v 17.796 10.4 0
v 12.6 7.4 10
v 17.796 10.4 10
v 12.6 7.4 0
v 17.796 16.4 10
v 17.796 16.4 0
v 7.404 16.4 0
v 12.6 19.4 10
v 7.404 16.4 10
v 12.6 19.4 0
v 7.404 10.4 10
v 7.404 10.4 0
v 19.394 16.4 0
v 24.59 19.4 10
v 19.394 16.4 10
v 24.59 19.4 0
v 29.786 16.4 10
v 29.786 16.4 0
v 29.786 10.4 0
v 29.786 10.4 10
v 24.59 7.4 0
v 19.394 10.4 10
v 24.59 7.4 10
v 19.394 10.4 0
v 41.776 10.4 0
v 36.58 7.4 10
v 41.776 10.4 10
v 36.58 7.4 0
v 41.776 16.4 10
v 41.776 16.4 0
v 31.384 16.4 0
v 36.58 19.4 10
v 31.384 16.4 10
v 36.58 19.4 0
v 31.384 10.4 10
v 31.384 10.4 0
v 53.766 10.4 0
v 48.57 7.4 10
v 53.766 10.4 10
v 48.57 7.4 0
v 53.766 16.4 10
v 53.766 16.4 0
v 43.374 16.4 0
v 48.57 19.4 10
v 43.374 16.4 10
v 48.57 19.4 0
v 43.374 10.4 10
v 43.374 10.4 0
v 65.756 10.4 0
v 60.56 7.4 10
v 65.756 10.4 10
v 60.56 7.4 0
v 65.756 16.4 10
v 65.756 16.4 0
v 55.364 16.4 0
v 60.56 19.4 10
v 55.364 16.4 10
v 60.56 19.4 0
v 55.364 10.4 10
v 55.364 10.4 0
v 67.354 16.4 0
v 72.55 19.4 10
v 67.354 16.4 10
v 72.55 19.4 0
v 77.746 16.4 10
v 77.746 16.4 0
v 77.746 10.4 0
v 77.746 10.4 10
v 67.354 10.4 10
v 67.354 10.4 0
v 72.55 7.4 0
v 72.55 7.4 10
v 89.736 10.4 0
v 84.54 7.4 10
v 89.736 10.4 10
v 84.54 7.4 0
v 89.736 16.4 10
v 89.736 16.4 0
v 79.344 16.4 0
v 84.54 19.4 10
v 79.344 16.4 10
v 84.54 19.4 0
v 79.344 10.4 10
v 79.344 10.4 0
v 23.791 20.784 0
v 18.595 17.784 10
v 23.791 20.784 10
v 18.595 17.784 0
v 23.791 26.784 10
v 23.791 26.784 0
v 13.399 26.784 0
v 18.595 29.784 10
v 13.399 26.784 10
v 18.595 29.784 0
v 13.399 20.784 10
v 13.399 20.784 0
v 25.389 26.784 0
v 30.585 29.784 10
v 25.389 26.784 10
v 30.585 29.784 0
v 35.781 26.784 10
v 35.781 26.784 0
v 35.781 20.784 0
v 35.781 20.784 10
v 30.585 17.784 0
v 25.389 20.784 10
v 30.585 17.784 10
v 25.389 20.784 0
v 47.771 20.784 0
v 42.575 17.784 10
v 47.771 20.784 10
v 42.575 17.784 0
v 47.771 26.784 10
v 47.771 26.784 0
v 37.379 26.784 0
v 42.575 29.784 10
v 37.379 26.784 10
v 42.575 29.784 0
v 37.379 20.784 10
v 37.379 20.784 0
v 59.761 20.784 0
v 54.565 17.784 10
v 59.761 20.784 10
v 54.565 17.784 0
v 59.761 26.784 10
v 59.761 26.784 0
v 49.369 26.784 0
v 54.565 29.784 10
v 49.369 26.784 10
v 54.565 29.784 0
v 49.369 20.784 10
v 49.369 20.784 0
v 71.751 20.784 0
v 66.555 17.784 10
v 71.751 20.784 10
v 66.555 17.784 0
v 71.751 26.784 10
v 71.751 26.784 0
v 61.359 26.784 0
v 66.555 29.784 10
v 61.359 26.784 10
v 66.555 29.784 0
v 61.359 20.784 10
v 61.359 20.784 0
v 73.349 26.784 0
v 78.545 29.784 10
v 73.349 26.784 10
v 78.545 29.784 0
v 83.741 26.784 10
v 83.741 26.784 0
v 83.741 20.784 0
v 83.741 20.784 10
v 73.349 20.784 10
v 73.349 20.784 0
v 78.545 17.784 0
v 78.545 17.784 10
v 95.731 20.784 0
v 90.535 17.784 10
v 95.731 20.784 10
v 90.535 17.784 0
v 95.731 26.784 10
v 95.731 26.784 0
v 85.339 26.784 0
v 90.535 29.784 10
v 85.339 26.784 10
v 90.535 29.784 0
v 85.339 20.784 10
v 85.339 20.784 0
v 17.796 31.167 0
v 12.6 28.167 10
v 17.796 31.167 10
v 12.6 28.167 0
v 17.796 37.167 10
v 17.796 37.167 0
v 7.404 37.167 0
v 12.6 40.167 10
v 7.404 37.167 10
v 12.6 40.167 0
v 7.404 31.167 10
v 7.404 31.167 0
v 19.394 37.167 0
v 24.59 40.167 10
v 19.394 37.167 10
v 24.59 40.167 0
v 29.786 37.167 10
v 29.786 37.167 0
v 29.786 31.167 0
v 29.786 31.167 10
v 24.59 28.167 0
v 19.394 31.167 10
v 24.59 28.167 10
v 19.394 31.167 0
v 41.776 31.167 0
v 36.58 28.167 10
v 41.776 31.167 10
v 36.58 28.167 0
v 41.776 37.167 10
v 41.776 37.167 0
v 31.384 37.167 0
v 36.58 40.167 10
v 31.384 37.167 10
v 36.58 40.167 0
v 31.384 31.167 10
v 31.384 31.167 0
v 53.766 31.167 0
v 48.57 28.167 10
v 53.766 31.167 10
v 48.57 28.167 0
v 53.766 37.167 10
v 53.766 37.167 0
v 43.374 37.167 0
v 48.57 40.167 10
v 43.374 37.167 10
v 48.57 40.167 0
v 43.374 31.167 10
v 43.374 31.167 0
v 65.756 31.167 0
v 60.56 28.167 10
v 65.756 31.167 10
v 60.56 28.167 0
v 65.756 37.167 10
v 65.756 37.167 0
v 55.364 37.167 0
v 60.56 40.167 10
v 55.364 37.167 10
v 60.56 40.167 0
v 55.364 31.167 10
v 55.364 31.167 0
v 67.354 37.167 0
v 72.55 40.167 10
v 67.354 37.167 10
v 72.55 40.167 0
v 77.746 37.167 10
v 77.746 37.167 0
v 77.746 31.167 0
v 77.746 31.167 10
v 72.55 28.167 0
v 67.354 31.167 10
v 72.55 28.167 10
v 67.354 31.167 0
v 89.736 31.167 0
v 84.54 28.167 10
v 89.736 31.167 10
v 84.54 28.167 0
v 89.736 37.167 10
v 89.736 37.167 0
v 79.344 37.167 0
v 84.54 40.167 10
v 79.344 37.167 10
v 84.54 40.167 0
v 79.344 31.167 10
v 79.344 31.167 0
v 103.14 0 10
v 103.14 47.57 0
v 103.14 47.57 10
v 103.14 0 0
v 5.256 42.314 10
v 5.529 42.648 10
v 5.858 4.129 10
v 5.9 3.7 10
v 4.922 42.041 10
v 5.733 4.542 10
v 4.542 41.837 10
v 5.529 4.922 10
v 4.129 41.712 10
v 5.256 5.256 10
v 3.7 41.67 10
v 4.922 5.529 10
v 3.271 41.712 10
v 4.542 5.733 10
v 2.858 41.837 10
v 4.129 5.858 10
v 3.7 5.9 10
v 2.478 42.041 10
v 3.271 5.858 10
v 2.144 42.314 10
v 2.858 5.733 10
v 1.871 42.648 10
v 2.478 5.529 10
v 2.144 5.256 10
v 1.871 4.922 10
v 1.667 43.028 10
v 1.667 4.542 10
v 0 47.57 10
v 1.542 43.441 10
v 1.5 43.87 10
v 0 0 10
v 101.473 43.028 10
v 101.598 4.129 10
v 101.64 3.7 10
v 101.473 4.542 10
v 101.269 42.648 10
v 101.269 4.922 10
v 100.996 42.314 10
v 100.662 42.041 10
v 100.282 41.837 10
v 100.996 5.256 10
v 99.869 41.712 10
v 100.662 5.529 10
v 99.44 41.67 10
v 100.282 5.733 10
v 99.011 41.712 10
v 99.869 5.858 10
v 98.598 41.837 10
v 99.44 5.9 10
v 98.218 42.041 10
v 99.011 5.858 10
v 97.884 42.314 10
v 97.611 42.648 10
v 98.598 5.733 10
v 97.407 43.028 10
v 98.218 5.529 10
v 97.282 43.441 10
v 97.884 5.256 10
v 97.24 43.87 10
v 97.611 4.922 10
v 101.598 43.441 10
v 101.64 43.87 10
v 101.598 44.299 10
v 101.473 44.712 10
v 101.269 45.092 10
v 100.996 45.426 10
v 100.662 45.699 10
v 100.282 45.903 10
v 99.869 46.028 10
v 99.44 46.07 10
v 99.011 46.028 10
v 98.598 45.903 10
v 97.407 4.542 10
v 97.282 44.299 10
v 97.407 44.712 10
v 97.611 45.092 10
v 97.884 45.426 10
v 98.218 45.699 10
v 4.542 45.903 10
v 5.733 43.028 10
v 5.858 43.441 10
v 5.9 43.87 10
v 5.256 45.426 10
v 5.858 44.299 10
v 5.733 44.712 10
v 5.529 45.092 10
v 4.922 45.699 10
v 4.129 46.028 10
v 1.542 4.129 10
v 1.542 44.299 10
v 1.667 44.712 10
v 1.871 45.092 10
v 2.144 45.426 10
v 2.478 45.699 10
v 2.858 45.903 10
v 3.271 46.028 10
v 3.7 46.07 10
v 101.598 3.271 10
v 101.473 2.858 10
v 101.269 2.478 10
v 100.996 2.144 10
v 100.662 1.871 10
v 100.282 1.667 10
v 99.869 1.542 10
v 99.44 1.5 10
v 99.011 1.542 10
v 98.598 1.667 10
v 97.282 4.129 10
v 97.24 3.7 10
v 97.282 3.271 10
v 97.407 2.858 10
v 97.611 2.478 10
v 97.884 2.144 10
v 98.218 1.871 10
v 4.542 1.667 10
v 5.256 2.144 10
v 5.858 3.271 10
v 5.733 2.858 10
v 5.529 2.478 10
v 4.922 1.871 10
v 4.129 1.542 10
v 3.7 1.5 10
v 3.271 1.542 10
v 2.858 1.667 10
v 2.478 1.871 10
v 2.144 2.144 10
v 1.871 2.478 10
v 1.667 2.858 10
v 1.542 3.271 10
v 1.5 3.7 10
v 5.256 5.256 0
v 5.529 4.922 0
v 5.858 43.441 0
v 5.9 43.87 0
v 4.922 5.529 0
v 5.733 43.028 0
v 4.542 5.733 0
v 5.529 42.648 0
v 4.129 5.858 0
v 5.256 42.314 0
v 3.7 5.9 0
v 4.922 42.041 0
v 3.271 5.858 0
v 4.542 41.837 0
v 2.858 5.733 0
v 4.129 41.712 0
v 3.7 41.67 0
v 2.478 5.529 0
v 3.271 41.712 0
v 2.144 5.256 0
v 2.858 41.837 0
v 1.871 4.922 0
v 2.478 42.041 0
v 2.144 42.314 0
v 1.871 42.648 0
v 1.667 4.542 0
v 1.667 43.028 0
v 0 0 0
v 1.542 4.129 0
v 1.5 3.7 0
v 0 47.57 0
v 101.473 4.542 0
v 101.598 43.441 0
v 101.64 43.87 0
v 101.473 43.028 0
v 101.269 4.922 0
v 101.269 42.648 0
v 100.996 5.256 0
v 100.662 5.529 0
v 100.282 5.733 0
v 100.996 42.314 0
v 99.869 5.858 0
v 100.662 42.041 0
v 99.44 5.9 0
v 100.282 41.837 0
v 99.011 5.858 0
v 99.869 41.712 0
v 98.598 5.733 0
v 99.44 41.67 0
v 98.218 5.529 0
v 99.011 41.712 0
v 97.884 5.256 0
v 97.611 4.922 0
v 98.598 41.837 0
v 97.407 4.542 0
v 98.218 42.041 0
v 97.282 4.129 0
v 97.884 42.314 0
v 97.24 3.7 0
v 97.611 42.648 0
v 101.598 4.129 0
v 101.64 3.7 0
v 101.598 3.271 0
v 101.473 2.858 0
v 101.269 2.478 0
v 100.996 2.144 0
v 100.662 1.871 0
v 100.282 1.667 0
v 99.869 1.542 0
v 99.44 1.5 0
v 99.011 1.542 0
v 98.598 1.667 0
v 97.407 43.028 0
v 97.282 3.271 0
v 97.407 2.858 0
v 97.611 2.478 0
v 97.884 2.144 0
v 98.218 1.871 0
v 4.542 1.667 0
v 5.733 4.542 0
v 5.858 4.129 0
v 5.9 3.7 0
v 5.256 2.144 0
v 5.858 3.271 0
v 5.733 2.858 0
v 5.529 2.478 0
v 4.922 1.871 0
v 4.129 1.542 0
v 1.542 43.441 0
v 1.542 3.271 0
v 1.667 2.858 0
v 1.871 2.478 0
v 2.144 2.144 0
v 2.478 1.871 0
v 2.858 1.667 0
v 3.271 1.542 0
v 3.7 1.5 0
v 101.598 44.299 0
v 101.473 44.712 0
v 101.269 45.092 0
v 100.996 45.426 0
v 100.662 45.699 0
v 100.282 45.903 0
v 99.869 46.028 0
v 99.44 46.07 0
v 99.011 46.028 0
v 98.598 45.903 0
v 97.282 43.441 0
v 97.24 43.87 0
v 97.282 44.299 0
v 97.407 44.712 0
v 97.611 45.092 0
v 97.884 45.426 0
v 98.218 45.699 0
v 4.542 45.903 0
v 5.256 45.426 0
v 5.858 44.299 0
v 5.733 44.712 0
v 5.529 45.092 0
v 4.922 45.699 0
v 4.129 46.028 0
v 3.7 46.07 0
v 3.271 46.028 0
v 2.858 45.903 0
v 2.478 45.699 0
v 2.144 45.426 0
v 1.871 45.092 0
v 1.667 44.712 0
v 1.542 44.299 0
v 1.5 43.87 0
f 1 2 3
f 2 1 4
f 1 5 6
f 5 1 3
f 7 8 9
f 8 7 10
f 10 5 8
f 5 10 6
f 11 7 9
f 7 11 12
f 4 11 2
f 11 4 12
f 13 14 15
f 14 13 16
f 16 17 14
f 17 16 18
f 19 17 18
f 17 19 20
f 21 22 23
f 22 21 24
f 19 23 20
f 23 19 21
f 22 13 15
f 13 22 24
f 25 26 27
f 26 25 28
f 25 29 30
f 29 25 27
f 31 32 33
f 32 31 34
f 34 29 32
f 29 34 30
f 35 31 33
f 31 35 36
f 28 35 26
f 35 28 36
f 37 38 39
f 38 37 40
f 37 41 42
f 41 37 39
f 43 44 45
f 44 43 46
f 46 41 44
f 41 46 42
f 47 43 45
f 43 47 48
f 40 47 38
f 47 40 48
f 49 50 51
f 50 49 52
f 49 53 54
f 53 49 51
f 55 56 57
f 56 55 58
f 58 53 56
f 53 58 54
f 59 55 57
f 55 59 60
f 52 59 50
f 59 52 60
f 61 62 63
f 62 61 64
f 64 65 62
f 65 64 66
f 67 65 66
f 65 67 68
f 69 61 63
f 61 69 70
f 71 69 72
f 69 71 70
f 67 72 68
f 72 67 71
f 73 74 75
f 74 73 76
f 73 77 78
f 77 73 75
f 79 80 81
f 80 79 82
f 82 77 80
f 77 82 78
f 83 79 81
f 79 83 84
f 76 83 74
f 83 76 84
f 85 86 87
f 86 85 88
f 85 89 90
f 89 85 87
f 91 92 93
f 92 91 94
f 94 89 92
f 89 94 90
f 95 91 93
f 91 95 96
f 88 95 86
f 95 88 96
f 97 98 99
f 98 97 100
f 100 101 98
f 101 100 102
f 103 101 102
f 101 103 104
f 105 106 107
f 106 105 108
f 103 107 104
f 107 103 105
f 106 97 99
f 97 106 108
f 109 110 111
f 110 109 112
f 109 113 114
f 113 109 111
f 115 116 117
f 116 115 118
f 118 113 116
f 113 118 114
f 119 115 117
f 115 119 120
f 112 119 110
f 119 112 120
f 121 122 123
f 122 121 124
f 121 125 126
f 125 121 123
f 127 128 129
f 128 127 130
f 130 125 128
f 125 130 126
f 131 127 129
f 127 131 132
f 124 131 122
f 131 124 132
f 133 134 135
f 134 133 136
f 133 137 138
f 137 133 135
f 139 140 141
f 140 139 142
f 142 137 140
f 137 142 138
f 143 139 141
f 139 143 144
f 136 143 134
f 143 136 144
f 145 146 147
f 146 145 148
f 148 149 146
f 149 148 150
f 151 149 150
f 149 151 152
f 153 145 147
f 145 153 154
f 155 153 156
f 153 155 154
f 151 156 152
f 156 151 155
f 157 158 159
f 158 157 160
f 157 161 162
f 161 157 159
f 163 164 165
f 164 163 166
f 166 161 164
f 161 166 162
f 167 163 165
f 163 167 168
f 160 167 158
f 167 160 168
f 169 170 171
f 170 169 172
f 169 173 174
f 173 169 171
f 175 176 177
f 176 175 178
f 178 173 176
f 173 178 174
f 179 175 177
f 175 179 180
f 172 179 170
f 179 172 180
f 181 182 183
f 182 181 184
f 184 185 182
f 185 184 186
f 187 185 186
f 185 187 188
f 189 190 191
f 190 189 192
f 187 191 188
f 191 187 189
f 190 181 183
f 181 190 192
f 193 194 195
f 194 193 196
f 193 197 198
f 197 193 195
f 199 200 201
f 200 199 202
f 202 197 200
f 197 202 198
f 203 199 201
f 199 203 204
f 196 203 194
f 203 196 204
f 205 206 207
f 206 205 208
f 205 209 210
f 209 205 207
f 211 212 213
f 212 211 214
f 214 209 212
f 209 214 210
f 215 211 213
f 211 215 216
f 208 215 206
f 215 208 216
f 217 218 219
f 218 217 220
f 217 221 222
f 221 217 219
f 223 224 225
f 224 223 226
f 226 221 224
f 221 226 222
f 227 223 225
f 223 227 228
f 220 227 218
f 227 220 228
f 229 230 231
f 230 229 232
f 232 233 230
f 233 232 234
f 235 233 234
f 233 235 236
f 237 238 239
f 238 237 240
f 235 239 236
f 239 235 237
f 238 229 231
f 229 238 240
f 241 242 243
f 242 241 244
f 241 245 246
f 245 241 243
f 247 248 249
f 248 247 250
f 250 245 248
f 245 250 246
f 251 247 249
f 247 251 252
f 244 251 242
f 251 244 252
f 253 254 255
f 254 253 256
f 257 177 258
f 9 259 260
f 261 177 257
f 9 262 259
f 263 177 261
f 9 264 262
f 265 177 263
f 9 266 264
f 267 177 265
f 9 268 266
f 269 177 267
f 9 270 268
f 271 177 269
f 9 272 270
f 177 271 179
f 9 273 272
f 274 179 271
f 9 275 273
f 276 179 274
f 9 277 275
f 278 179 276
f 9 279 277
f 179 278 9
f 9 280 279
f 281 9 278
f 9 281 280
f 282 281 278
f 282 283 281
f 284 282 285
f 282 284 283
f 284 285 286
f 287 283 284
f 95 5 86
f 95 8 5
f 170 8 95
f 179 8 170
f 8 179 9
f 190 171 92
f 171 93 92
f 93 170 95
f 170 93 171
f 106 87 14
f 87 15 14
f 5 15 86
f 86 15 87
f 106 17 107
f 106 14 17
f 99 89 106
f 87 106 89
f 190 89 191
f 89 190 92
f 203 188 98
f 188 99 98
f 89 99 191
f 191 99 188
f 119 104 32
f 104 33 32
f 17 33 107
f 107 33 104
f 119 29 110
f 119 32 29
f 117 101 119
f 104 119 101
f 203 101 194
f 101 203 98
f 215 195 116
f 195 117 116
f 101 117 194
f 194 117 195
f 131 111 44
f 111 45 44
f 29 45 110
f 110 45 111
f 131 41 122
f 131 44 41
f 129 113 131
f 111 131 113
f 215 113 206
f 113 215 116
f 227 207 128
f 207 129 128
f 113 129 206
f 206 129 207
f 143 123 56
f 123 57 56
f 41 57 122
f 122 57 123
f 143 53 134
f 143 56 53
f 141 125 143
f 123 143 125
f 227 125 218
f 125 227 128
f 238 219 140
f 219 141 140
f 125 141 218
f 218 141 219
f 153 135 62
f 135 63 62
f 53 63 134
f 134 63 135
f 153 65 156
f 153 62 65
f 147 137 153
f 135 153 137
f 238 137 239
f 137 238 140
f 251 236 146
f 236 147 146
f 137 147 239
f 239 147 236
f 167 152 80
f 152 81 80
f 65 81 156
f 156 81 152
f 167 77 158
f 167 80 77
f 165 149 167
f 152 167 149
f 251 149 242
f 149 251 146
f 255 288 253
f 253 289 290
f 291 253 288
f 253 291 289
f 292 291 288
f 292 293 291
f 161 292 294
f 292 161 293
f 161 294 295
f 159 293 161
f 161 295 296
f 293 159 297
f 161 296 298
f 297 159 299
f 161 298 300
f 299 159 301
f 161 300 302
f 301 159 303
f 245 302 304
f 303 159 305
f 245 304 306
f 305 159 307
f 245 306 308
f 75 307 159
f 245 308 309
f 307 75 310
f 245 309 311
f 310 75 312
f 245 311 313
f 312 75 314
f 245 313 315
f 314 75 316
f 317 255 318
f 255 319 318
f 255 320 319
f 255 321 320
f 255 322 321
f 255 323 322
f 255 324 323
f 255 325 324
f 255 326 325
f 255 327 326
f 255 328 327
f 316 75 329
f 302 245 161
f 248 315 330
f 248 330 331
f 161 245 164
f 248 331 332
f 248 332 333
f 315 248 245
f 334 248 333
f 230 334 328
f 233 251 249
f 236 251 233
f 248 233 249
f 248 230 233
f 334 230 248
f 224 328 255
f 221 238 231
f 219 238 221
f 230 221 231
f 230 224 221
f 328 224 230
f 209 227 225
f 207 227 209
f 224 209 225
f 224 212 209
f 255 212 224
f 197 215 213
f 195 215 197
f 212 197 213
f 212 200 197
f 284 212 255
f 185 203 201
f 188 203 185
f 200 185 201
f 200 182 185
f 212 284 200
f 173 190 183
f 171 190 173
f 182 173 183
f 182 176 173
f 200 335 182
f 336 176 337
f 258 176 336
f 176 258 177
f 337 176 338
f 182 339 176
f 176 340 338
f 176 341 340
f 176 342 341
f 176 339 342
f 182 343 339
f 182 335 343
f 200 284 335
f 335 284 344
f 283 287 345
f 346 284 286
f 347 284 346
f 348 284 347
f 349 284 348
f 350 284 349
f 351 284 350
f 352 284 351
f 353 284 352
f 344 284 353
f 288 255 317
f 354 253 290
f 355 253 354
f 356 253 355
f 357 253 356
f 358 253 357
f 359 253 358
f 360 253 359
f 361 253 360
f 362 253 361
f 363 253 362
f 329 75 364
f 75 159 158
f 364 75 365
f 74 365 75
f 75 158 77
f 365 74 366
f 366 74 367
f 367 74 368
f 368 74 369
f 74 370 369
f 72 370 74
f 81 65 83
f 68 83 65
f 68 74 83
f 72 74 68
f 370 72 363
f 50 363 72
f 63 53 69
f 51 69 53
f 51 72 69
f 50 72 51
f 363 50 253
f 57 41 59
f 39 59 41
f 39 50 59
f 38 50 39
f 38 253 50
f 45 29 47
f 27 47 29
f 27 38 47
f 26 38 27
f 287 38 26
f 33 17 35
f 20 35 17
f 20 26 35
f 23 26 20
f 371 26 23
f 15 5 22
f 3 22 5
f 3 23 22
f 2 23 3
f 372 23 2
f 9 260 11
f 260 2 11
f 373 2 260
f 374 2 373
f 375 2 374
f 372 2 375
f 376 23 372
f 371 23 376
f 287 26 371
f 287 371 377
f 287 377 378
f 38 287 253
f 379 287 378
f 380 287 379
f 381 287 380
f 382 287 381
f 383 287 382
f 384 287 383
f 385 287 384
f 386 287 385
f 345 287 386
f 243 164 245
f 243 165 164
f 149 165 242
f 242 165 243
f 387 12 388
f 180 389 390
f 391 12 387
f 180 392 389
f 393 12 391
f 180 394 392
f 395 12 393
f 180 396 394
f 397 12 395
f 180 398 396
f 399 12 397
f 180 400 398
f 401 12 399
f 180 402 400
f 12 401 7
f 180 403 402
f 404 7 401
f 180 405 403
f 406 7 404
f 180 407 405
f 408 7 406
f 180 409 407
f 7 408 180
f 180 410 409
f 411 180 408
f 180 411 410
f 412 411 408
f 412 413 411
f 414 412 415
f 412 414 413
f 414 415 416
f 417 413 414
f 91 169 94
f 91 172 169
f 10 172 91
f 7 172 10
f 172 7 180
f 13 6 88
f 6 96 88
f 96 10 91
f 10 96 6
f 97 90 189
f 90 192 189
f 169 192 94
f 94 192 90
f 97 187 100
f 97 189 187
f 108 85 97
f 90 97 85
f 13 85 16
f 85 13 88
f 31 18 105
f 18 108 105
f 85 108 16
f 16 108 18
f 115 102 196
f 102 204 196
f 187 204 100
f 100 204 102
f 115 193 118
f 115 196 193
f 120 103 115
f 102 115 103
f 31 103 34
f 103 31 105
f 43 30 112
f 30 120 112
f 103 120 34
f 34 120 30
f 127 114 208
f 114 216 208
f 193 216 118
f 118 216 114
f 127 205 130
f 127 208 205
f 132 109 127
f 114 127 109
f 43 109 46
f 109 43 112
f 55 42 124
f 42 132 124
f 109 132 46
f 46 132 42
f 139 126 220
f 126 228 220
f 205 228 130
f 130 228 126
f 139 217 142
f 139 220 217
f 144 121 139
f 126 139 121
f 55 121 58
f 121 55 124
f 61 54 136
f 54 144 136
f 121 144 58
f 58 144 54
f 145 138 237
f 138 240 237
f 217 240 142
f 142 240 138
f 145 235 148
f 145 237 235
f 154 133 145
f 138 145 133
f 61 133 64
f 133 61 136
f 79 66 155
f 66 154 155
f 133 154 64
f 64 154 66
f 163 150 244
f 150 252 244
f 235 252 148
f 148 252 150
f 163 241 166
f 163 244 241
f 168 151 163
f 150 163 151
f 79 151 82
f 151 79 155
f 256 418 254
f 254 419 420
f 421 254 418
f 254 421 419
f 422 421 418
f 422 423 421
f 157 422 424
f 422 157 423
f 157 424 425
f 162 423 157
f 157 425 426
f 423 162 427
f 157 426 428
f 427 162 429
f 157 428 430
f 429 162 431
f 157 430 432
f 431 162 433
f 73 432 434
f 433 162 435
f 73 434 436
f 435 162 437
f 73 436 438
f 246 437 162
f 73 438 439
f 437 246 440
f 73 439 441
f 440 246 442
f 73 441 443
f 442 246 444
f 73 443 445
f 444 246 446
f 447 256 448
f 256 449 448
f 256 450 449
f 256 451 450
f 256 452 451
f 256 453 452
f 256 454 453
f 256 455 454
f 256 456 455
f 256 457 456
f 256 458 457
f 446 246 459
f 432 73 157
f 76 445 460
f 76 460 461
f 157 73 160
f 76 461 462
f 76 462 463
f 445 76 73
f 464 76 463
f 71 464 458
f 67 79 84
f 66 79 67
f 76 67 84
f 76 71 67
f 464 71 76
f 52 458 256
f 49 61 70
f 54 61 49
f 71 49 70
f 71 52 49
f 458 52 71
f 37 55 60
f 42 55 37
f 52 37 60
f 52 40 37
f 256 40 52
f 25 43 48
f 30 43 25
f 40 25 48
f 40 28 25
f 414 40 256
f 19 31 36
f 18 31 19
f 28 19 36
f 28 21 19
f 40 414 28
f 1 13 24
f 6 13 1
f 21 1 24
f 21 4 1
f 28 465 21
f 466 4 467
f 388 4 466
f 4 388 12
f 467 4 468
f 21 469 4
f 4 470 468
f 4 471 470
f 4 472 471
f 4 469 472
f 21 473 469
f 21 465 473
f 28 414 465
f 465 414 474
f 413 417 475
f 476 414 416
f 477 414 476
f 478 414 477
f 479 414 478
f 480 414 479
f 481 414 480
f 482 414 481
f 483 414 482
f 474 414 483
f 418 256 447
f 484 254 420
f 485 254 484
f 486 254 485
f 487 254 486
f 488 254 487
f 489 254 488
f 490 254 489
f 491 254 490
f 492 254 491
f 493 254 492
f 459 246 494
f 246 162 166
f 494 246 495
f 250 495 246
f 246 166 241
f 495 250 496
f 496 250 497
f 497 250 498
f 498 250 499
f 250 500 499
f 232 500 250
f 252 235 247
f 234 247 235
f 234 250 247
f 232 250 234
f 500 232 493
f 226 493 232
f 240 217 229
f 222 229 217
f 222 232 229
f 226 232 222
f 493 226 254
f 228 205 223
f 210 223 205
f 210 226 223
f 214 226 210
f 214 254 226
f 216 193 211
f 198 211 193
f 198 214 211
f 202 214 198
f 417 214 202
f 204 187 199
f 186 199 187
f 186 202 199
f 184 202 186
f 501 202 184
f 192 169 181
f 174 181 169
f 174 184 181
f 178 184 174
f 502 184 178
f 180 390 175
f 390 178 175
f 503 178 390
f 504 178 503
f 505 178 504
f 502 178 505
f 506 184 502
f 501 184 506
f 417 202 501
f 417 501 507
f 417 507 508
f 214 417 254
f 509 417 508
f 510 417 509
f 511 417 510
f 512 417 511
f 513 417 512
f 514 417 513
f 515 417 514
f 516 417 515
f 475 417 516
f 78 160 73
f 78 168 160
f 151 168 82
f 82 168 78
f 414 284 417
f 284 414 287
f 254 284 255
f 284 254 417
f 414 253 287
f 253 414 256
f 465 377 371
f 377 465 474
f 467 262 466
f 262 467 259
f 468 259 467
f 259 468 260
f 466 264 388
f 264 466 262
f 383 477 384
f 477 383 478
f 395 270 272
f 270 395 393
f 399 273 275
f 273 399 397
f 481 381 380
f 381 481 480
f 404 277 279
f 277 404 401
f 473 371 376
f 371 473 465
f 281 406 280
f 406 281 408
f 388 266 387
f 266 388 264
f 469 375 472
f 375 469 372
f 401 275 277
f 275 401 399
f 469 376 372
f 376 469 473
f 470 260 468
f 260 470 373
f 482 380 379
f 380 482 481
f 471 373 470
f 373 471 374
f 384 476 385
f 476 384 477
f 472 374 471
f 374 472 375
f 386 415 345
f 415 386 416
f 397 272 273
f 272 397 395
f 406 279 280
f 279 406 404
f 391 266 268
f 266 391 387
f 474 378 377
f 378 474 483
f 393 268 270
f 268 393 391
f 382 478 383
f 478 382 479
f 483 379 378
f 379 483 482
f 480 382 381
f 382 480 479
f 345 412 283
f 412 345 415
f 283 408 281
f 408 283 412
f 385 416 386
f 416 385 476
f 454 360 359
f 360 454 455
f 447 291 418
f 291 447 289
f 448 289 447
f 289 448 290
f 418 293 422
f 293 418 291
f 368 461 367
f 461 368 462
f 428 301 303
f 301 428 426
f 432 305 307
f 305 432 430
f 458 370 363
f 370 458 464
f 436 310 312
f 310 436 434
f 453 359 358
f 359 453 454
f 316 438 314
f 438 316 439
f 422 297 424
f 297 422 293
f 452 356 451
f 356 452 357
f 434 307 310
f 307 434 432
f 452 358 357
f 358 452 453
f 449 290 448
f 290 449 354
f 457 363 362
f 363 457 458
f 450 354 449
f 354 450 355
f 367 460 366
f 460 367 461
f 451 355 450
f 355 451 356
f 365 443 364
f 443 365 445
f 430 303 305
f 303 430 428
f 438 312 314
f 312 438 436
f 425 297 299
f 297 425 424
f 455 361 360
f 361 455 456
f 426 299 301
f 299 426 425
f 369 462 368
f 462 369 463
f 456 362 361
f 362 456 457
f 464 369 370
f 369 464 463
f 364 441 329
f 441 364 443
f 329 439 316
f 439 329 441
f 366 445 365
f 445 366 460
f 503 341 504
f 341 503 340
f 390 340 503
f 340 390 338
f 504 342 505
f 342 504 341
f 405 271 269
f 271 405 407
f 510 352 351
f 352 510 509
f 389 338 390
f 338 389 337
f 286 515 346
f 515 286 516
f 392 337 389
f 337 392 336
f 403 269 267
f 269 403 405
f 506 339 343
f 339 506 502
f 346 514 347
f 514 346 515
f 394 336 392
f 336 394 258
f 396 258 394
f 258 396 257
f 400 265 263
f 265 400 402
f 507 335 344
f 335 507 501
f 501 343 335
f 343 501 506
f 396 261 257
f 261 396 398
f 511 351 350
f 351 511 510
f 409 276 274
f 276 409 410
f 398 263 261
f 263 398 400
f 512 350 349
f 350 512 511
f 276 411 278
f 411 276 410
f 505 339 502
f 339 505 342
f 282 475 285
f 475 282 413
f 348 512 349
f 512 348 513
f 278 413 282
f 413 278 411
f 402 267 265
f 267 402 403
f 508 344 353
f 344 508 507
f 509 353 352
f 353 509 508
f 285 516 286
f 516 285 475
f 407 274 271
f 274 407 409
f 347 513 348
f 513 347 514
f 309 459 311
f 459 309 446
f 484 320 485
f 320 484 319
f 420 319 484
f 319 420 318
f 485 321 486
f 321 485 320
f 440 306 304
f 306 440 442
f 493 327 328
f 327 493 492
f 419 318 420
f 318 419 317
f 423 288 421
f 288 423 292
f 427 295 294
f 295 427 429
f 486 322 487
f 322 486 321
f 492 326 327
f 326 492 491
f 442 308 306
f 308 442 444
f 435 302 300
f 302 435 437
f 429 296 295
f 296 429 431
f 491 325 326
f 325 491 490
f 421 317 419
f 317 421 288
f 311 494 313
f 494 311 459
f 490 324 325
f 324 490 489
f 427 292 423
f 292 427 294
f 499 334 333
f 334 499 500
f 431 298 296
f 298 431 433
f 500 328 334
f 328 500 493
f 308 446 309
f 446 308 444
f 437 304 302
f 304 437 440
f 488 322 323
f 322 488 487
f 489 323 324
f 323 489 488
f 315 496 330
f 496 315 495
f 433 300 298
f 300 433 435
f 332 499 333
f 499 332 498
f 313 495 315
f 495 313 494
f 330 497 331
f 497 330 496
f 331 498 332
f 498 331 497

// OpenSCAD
$fn = 32;

// ----------------------------------------------------------------------
// Honeycomb panel: 103.14 x 47.57 mm, 21 cells of 12 mm
// ----------------------------------------------------------------------

// --- parameters (mm) ---
panel_w = 103.14;         // panel width
panel_d = 47.57;          // panel depth
thick = 10;               // panel thickness
cell_r = 6;               // hex cell circumradius
pitch = 11.99;            // hex cell pitch (centre to centre)
web = 1.6;                // web between the cells
columns = 7;              // columns of cells
rows = 3;                 // rows of cells
cell_count = 21;          // total cells
shift_x = 12.6;           // first cell offset in x
shift_y = 13.4;           // first cell offset in y
mount_d = 4.4;            // corner mounting holes
hole_off = 3.7;           // mounting hole offset from the corners

difference() {
  union() {
    cube([panel_w, panel_d, thick]);
  }
  /* hexagonal cells, point-up, cut right through the plate */
  for (row = [0 : rows - 1]) {
    for (col = [0 : columns - 1]) {
      translate([shift_x + col * pitch + (row % 2) * pitch / 2, shift_y + row * pitch * 0.866025, -2.5]) rotate([0, 0, 30]) cylinder(h = thick + 5, d = 2 * cell_r, $fn = 6);
    }
  }
  /* corner mounting holes, clear of the outer cell web */
  translate([3.7, 3.7, -2.5]) cylinder(h = thick + 5, d = mount_d);
  translate([99.44, 3.7, -2.5]) cylinder(h = thick + 5, d = mount_d);
  translate([3.7, 43.87, -2.5]) cylinder(h = thick + 5, d = mount_d);
  translate([99.44, 43.87, -2.5]) cylinder(h = thick + 5, d = mount_d);
}
